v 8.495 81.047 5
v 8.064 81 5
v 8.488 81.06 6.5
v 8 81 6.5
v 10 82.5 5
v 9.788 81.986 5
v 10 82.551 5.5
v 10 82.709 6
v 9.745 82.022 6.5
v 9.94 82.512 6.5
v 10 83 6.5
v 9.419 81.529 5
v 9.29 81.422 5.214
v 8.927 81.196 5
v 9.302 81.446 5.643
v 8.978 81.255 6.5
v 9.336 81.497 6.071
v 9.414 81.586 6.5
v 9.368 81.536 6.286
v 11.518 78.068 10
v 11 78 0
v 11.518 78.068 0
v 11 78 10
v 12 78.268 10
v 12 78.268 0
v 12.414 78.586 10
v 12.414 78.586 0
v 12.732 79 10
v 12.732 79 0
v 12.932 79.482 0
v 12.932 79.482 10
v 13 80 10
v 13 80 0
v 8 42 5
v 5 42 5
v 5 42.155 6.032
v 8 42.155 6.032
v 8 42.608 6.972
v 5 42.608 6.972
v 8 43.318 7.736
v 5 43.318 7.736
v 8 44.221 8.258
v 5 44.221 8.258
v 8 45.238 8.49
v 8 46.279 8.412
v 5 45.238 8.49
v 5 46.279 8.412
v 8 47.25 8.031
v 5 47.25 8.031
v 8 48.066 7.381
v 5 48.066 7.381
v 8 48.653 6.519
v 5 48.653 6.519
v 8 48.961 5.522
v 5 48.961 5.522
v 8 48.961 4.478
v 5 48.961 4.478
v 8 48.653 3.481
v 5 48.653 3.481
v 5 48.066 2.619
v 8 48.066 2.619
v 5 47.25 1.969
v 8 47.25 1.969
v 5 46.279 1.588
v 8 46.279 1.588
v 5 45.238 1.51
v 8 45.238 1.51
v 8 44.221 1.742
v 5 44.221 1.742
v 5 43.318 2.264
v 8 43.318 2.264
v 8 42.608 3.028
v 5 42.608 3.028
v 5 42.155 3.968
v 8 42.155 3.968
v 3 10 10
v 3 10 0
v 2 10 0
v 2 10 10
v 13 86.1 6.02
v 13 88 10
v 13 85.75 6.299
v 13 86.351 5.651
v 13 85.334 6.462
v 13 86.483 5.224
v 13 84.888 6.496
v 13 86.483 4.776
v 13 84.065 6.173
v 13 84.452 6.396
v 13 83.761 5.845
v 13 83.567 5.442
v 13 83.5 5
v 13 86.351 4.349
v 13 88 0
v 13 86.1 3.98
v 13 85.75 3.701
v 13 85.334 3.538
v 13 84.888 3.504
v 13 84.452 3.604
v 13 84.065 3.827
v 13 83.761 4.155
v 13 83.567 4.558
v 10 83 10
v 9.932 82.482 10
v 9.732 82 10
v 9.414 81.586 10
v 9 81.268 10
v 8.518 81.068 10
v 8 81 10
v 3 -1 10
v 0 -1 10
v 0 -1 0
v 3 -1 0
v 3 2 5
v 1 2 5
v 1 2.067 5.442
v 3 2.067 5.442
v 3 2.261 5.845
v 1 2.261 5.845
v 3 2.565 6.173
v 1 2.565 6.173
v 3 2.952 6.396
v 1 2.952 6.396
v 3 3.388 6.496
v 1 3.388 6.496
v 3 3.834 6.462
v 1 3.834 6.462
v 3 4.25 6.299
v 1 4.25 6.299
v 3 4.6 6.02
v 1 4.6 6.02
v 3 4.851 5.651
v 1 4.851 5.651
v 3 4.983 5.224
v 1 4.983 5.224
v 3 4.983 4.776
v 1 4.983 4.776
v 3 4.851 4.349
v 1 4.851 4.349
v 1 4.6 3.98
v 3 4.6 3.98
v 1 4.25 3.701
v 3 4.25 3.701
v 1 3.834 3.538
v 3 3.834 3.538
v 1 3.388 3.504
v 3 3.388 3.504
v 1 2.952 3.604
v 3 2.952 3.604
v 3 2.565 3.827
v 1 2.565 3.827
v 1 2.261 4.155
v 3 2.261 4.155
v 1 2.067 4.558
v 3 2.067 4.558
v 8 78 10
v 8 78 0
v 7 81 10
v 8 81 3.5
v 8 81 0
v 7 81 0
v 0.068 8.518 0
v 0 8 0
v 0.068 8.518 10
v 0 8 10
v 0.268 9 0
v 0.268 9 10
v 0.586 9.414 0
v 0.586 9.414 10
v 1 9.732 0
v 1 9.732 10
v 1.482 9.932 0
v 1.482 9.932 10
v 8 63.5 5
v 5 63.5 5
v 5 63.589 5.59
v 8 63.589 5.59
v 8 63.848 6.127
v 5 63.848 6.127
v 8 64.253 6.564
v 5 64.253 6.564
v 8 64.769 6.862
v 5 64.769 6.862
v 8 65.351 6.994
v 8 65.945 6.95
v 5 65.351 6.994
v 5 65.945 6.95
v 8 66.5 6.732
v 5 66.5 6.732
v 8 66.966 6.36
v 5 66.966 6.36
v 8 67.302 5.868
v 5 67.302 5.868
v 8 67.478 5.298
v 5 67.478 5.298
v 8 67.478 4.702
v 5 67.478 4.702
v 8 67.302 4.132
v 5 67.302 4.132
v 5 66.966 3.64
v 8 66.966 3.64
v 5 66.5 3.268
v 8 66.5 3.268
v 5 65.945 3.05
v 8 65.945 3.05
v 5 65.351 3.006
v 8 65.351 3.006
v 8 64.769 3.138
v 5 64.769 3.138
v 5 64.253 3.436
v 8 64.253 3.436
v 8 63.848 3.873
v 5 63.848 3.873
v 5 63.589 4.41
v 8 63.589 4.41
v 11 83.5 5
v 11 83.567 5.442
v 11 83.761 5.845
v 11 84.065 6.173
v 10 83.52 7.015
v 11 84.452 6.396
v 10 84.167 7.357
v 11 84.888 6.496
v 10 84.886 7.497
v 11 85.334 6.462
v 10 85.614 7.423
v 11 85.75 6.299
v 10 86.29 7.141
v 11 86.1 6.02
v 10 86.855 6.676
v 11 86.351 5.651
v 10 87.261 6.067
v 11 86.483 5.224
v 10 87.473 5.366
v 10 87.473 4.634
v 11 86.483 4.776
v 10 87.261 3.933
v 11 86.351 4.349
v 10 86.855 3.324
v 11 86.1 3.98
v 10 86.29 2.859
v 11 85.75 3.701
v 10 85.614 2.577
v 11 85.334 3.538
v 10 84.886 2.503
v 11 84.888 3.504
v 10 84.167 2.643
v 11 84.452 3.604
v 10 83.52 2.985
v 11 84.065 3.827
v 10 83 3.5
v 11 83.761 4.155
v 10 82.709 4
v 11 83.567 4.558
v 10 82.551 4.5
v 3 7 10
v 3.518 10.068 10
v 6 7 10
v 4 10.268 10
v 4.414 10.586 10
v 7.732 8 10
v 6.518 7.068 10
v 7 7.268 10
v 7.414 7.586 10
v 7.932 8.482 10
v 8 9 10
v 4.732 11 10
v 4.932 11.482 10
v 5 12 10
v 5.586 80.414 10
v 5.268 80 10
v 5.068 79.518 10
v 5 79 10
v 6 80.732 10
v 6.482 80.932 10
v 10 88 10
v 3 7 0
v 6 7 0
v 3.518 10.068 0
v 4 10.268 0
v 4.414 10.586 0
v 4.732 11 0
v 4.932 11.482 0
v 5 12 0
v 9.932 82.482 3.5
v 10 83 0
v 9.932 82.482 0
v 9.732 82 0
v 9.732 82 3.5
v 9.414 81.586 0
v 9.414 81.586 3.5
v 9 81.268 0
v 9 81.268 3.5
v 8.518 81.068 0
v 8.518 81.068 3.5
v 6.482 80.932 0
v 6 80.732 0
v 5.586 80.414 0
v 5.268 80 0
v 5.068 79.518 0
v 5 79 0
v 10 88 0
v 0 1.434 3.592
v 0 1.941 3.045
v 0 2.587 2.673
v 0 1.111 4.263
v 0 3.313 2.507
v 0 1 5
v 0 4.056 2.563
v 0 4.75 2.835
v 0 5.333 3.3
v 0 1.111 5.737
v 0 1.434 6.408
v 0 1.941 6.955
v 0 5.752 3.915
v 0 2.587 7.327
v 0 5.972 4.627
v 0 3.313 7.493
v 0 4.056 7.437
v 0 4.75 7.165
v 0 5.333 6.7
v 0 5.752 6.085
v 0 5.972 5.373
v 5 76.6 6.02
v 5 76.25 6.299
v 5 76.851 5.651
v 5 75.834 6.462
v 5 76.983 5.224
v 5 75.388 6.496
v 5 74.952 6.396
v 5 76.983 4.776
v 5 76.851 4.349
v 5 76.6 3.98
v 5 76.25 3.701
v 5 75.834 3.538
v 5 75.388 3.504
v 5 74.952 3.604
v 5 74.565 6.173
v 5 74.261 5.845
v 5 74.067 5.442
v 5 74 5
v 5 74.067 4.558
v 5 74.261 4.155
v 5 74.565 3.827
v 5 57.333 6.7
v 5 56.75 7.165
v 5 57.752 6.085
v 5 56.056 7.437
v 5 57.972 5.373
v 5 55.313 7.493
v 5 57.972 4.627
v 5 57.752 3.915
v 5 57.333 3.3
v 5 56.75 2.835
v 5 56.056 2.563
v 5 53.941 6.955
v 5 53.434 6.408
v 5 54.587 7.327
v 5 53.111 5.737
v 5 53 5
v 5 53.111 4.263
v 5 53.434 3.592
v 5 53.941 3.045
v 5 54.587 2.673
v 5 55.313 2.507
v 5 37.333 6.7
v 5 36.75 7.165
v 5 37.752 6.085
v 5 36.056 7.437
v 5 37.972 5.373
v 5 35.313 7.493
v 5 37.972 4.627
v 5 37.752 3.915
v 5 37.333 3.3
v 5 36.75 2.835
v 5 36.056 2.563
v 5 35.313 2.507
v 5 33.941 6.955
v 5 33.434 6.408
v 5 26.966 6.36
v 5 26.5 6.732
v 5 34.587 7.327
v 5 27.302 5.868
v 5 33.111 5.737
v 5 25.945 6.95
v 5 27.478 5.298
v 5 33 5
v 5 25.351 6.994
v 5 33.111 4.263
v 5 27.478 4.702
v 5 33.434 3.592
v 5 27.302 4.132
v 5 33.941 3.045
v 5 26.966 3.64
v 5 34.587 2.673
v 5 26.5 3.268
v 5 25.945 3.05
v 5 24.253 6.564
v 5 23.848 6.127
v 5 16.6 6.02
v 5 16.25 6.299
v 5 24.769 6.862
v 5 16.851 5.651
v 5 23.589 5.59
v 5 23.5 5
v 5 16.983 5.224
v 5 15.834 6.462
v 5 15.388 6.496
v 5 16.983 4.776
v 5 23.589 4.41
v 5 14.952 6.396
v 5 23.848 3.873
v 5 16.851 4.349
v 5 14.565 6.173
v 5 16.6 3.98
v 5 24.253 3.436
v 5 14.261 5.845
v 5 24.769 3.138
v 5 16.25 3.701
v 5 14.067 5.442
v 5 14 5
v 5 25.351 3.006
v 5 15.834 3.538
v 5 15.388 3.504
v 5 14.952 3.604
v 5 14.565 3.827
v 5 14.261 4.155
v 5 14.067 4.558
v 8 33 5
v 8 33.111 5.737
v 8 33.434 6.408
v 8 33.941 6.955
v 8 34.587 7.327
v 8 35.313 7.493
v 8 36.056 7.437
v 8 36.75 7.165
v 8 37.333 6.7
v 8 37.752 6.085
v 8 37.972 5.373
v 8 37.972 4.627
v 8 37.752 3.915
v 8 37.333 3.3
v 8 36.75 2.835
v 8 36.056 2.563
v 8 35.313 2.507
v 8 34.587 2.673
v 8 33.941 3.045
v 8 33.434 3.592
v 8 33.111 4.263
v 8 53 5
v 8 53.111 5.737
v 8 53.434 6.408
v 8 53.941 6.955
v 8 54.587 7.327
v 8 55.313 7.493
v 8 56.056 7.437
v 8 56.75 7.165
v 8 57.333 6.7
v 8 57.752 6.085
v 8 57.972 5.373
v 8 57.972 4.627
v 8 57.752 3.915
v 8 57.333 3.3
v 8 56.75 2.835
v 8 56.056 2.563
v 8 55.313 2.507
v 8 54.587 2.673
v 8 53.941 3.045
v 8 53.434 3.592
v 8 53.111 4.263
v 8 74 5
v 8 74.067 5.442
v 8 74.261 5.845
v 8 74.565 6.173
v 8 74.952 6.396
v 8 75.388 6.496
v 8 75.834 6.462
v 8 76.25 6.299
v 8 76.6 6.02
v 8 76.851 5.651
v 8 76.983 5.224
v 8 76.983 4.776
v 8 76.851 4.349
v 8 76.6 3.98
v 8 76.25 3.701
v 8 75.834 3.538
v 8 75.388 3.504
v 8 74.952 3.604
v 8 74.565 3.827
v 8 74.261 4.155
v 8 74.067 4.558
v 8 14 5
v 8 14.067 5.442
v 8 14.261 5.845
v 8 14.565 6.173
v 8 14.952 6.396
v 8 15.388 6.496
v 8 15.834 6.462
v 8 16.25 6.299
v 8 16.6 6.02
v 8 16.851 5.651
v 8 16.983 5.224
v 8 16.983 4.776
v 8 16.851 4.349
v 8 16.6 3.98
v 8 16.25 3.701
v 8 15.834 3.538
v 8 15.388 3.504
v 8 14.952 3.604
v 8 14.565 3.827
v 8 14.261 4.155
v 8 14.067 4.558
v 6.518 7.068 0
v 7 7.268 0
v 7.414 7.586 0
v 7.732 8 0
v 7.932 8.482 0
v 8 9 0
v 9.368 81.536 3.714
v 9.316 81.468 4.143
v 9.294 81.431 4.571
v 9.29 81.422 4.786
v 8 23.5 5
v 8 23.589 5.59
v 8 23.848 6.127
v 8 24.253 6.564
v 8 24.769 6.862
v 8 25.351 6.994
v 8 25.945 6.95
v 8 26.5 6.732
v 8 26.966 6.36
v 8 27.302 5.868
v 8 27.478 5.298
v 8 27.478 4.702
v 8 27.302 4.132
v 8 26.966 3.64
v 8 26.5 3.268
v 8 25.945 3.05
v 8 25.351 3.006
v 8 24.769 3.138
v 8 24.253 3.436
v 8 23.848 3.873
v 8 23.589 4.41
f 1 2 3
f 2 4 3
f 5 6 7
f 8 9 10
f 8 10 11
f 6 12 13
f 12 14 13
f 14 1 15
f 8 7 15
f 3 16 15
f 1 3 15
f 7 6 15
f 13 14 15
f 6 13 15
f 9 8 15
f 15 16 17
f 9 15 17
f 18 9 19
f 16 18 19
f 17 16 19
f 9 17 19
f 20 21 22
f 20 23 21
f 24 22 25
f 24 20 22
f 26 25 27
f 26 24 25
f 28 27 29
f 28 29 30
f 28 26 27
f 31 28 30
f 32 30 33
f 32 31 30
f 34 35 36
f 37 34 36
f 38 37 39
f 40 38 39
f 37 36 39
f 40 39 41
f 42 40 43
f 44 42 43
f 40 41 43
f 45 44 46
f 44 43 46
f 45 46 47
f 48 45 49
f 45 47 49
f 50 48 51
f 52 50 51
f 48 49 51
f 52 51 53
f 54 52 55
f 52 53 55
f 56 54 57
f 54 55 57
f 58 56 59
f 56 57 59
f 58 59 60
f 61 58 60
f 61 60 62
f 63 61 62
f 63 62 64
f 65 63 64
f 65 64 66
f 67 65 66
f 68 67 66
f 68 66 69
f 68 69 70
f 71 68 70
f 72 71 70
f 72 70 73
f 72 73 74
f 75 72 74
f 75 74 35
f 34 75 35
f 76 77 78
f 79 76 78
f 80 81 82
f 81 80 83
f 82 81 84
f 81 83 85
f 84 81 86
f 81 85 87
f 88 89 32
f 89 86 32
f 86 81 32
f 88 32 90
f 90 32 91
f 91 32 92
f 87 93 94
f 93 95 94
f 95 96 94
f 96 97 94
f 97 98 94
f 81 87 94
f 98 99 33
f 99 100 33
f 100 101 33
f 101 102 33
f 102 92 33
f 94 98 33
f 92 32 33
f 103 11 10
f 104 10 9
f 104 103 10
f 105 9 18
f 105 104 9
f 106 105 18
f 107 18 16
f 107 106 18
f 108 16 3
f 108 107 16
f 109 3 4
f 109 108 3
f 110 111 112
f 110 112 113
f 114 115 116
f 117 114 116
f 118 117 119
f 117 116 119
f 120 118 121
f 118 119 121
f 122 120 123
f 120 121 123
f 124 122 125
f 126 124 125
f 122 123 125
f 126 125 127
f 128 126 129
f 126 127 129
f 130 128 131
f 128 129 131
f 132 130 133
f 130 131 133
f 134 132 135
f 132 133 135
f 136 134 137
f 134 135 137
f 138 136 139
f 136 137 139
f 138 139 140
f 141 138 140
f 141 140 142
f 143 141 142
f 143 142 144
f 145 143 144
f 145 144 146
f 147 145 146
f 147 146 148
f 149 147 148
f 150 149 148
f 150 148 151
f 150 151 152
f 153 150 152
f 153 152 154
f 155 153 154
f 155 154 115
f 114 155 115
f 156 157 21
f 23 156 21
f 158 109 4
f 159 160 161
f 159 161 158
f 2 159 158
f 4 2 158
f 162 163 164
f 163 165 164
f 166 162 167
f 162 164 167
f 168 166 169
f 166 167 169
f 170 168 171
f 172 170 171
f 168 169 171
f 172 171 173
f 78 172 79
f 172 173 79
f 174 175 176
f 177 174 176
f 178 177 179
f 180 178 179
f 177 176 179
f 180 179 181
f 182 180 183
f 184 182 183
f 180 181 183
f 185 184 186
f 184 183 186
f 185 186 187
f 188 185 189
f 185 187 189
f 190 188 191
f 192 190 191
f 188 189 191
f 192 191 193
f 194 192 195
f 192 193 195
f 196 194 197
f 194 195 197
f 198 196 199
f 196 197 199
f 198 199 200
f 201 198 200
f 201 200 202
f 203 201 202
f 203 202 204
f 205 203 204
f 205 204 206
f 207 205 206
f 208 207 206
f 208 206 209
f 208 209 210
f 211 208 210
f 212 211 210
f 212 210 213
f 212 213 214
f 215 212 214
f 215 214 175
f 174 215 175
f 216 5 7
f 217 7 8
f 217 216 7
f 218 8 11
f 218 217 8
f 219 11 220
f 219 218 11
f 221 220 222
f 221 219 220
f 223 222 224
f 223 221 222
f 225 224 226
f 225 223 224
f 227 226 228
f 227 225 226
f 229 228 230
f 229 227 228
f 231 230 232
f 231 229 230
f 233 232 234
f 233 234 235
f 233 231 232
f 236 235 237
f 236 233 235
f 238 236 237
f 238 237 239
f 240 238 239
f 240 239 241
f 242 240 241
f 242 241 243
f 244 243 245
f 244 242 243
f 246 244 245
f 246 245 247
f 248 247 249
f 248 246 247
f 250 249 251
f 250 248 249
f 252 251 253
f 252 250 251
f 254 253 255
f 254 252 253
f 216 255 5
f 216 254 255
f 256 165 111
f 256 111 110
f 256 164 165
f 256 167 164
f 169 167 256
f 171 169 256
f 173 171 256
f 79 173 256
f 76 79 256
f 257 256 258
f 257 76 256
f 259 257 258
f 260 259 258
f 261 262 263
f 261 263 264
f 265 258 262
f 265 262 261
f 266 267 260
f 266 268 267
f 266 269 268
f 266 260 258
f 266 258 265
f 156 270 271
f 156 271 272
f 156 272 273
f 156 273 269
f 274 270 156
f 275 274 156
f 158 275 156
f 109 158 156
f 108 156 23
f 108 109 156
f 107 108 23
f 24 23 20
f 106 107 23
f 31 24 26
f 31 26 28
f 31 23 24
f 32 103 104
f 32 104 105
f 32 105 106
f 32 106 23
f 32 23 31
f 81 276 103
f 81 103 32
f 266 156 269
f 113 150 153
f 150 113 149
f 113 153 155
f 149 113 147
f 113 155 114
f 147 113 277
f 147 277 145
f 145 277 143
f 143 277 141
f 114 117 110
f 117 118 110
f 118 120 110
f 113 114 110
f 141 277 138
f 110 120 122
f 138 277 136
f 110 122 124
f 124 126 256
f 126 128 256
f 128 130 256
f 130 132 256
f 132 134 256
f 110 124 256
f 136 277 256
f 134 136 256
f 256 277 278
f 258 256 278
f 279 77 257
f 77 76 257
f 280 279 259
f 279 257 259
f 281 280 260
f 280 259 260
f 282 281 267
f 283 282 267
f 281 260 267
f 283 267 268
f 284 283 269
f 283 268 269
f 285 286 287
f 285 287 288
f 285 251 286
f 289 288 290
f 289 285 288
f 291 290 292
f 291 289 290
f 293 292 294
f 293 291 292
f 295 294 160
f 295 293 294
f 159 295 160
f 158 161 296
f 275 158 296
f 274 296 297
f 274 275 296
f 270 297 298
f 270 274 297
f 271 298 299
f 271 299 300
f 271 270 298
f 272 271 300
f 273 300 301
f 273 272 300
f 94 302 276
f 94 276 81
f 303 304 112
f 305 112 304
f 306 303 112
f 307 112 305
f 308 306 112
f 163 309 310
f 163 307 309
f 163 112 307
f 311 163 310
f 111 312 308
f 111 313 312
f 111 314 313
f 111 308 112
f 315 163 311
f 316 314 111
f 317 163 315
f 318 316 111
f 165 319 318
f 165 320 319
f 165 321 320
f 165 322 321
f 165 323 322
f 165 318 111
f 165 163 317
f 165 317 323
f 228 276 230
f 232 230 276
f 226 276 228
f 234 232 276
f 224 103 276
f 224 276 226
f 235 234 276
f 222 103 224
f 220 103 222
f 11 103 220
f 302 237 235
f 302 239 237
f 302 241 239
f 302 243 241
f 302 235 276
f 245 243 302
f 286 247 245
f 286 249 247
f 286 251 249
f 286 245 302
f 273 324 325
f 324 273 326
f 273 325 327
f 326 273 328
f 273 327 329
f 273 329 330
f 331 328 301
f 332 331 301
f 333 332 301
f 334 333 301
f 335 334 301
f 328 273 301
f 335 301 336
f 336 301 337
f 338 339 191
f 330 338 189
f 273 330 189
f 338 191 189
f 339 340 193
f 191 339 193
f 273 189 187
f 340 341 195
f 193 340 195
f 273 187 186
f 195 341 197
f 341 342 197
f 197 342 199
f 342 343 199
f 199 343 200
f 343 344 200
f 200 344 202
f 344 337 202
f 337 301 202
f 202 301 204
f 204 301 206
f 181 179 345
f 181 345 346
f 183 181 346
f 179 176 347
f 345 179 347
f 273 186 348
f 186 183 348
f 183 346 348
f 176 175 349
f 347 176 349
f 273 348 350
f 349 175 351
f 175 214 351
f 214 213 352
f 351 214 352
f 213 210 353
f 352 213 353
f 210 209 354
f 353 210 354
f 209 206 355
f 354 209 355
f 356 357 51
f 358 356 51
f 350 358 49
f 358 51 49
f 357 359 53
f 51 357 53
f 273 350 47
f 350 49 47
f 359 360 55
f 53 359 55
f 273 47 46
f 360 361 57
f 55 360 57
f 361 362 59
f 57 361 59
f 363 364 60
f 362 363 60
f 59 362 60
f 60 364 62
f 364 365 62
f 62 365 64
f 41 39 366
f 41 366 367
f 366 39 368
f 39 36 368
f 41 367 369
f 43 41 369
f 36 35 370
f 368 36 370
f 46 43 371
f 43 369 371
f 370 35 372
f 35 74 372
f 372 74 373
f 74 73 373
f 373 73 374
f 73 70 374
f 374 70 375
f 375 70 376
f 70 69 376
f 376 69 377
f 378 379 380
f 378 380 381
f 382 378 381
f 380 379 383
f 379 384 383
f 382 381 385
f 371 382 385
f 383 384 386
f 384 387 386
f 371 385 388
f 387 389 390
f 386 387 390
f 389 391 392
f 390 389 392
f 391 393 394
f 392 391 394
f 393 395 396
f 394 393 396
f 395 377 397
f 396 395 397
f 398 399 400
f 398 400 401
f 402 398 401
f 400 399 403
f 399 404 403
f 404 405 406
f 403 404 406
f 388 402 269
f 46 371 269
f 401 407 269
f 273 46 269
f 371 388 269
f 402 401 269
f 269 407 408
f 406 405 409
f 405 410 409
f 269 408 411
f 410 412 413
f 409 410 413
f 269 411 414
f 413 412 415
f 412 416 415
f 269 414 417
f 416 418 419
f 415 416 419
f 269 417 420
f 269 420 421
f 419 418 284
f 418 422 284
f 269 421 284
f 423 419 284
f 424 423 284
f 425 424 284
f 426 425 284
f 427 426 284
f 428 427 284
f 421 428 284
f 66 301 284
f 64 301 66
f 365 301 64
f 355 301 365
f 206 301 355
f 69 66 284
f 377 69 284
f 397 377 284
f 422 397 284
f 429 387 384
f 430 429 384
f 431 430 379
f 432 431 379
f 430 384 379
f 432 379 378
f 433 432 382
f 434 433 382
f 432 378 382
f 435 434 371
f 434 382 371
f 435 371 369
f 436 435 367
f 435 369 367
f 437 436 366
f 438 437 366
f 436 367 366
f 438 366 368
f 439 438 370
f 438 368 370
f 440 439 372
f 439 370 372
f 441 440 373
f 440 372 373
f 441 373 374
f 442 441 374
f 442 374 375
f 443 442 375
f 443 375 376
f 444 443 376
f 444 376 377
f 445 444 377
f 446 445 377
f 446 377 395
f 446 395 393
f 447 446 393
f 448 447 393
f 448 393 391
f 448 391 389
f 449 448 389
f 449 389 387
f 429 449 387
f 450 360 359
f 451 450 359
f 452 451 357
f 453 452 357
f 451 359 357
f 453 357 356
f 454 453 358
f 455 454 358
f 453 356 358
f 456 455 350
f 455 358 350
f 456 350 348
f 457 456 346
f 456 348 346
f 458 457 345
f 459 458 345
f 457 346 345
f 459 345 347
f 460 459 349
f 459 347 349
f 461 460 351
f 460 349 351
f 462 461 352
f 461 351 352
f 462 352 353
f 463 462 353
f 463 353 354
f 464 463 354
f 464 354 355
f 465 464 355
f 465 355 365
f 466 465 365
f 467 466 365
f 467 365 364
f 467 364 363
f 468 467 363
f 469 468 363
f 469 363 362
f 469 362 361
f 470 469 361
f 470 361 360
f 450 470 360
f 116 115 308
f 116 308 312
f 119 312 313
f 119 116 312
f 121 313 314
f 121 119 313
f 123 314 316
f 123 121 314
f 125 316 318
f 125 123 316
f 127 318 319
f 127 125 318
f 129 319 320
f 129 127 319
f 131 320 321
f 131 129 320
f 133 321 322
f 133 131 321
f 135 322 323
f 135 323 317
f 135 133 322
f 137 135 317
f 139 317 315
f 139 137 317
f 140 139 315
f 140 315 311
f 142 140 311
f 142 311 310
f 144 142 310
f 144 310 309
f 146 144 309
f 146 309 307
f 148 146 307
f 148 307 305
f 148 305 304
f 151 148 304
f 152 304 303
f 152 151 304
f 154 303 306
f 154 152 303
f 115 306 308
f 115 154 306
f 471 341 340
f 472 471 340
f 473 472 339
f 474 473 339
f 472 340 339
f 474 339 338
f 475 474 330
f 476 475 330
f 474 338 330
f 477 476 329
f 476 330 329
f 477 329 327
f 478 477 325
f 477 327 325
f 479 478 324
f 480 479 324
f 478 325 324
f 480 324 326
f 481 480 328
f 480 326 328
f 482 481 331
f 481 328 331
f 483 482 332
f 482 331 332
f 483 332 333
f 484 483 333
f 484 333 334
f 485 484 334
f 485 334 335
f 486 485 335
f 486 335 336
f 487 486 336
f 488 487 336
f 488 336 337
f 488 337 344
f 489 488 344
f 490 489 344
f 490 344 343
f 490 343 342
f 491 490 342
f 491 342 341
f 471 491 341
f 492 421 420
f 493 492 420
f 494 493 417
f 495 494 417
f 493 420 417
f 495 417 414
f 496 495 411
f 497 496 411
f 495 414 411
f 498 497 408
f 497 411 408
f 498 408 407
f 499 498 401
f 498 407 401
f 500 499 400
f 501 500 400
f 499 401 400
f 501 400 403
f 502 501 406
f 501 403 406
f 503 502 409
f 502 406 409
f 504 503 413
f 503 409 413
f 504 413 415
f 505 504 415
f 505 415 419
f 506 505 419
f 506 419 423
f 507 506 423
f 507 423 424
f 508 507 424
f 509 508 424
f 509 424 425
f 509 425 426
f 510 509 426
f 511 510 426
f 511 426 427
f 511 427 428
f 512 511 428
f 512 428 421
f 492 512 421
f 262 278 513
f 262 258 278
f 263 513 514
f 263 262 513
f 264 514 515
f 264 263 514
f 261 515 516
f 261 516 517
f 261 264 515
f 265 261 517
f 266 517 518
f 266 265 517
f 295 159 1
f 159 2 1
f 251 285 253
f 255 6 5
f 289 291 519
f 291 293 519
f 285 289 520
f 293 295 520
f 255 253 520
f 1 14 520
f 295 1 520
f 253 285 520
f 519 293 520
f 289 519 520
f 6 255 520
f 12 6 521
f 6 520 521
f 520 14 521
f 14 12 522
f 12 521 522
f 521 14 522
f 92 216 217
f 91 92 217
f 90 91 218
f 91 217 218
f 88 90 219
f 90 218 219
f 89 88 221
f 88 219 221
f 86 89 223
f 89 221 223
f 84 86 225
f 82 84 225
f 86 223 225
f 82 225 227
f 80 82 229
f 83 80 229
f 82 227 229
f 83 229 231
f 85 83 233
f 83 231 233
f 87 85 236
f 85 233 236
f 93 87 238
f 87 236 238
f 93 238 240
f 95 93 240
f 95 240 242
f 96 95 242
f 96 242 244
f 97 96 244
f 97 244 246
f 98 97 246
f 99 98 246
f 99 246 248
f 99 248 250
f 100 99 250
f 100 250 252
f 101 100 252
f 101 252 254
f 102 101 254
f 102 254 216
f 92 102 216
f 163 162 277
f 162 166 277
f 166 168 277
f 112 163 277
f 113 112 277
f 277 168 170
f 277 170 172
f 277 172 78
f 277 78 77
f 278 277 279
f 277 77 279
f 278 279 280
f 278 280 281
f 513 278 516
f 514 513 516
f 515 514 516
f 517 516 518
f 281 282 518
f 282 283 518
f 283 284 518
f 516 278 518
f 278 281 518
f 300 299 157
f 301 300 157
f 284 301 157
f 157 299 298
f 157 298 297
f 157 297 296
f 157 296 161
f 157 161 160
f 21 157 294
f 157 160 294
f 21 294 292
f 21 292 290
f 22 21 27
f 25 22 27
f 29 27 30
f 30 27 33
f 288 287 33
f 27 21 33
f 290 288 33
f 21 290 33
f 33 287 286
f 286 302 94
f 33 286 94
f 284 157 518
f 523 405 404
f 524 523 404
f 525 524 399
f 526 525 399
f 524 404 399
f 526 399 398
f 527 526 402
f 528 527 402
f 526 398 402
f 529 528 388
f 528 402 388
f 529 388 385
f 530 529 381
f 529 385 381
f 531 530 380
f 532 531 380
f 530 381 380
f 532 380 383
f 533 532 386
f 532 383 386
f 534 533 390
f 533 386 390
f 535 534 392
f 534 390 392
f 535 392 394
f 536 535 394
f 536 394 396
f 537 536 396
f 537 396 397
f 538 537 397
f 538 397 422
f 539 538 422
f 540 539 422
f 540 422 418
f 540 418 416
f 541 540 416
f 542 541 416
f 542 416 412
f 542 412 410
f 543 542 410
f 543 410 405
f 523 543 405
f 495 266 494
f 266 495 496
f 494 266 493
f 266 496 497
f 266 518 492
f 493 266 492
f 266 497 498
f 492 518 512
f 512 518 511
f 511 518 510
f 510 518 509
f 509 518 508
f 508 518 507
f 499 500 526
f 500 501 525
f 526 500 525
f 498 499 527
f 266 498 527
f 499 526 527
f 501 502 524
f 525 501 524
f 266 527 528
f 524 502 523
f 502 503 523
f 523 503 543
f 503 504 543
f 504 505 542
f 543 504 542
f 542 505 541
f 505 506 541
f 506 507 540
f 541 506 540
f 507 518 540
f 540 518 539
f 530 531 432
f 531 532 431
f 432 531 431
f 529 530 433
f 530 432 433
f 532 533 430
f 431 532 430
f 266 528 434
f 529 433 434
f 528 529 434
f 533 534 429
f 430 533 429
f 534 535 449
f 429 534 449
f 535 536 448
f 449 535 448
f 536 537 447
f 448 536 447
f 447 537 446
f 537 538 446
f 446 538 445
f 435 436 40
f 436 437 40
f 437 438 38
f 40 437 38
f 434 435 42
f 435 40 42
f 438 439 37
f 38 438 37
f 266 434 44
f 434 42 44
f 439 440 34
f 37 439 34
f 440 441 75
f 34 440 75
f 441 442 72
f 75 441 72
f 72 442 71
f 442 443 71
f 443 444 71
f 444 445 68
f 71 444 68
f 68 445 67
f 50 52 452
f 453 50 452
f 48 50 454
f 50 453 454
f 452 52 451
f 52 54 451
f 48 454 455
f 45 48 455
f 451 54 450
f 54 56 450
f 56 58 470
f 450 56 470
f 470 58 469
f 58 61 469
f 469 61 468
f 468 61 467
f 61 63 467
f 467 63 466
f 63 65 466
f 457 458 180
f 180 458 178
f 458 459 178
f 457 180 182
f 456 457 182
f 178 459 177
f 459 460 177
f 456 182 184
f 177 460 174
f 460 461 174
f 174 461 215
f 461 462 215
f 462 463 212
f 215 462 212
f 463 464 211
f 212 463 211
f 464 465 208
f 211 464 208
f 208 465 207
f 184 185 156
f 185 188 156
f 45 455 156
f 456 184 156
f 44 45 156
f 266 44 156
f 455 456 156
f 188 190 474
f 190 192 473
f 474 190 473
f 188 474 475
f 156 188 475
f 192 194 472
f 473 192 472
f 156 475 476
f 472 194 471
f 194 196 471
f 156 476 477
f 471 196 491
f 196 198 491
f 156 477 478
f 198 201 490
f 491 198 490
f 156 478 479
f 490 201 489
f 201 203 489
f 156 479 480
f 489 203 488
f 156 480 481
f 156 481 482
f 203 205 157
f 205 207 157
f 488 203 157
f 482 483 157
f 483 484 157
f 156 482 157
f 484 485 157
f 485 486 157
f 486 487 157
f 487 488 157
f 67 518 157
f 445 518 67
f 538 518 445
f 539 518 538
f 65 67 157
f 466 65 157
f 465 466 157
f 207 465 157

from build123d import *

# Parameters (mm, degrees)
Y_KSEKLIK_EKSTR_ZYON1_DEPTH = 10
IZIM2_W                     = 3
IZIM2_H                     = 10
Y_KSEKLIK_EKSTR_ZYON2_DEPTH = 1
IZIM3_W                     = 3
IZIM3_H                     = 10
Y_KSEKLIK_EKSTR_ZYON3_DEPTH = 1
IZIM4_R                     = 1.5
KES_EKSTR_ZYON1_DEPTH       = 4
PAH1_SIZE                   = 1
IZIM5_R                     = 1.5
KES_EKSTR_ZYON2_DEPTH       = 4
PAH2_SIZE                   = 1
RADYUS1_R                   = 2
IZIM6_R                     = 3.5
IZIM6_R_2                   = 2.5
IZIM6_R_3                   = 2
IZIM6_R_4                   = 1.5
KES_EKSTR_ZYON3_DEPTH       = 4


with BuildPart() as part:
    # Çizim1 → Yükseklik-Ekstrüzyon1 (new body)
    with BuildSketch(Plane.XY):
        Polygon((10, 87), (10, 81), (5, 81), (5, 10), (0, 10), (0, 0), (3, 0), (3, 7), (8, 7), (8, 78), (13, 78), (13, 87), align=None)
    extrude(amount=Y_KSEKLIK_EKSTR_ZYON1_DEPTH)

    # Çizim2 → Yükseklik-Ekstrüzyon2 (add)
    with BuildSketch(Plane(origin=(0, 87, 0), x_dir=(1, 0, 0), z_dir=(0, 1, 0))):
        with Locations((11.5, -5)):
            Rectangle(IZIM2_W, IZIM2_H)
    extrude(amount=Y_KSEKLIK_EKSTR_ZYON2_DEPTH)

    # Çizim3 → Yükseklik-Ekstrüzyon3 (add)
    with BuildSketch(Plane.XZ):
        with Locations((1.5, 5)):
            Rectangle(IZIM3_W, IZIM3_H)
    extrude(amount=Y_KSEKLIK_EKSTR_ZYON3_DEPTH)

    # Çizim4 → Kes-Ekstrüzyon1 (cut)
    with BuildSketch(Plane.ZY.offset(-10)):
        with Locations(Location((5, 85, 0), (0, 0, 270))):
            Circle(IZIM4_R)
    extrude(amount=-KES_EKSTR_ZYON1_DEPTH, mode=Mode.SUBTRACT)

    # Pah1
    pah1_edges = [part.edges().sort_by_distance(p)[0] for p in [
        (10, 86.5, 5),
    ]]
    chamfer(pah1_edges, length=PAH1_SIZE)

    # Çizim5 → Kes-Ekstrüzyon2 (cut)
    with BuildSketch(Plane.ZY):
        with Locations(Location((5, 3.5, 0), (0, 0, 270))):
            Circle(IZIM5_R)
    extrude(amount=-KES_EKSTR_ZYON2_DEPTH, mode=Mode.SUBTRACT)

    # Pah2
    pah2_edges = [part.edges().sort_by_distance(p)[0] for p in [
        (0, 5, 5),
    ]]
    chamfer(pah2_edges, length=PAH2_SIZE)

    # Radyus1
    radyus1_edges = [part.edges().sort_by_distance(p)[0] for p in [
        (13, 78, 5),
        (8, 7, 5),
        (0, 10, 5),
        (5, 10, 5),
        (5, 81, 5),
        (10, 81, 5),
    ]]
    fillet(radyus1_edges, radius=RADYUS1_R)

    # Çizim6 → Kes-Ekstrüzyon3 (cut)
    with BuildSketch(Plane.ZY.offset(-5)):
        with Locations(Location((5, 45.5, 0), (0, 0, 270))):
            Circle(IZIM6_R)
        with Locations(Location((5, 55.5, 0), (0, 0, 270))):
            Circle(IZIM6_R_2)
        with Locations(Location((5, 65.5, 0), (0, 0, 270))):
            Circle(IZIM6_R_3)
        with Locations(Location((5, 75.5, 0), (0, 0, 270))):
            Circle(IZIM6_R_4)
        with Locations(Location((5, 15.5, 0), (0, 0, 270))):
            Circle(IZIM6_R_4)
        with Locations(Location((5, 25.5, 0), (0, 0, 270))):
            Circle(IZIM6_R_3)
        with Locations(Location((5, 35.5, 0), (0, 0, 270))):
            Circle(IZIM6_R_2)
    extrude(amount=-KES_EKSTR_ZYON3_DEPTH, mode=Mode.SUBTRACT)


solid = part.part
